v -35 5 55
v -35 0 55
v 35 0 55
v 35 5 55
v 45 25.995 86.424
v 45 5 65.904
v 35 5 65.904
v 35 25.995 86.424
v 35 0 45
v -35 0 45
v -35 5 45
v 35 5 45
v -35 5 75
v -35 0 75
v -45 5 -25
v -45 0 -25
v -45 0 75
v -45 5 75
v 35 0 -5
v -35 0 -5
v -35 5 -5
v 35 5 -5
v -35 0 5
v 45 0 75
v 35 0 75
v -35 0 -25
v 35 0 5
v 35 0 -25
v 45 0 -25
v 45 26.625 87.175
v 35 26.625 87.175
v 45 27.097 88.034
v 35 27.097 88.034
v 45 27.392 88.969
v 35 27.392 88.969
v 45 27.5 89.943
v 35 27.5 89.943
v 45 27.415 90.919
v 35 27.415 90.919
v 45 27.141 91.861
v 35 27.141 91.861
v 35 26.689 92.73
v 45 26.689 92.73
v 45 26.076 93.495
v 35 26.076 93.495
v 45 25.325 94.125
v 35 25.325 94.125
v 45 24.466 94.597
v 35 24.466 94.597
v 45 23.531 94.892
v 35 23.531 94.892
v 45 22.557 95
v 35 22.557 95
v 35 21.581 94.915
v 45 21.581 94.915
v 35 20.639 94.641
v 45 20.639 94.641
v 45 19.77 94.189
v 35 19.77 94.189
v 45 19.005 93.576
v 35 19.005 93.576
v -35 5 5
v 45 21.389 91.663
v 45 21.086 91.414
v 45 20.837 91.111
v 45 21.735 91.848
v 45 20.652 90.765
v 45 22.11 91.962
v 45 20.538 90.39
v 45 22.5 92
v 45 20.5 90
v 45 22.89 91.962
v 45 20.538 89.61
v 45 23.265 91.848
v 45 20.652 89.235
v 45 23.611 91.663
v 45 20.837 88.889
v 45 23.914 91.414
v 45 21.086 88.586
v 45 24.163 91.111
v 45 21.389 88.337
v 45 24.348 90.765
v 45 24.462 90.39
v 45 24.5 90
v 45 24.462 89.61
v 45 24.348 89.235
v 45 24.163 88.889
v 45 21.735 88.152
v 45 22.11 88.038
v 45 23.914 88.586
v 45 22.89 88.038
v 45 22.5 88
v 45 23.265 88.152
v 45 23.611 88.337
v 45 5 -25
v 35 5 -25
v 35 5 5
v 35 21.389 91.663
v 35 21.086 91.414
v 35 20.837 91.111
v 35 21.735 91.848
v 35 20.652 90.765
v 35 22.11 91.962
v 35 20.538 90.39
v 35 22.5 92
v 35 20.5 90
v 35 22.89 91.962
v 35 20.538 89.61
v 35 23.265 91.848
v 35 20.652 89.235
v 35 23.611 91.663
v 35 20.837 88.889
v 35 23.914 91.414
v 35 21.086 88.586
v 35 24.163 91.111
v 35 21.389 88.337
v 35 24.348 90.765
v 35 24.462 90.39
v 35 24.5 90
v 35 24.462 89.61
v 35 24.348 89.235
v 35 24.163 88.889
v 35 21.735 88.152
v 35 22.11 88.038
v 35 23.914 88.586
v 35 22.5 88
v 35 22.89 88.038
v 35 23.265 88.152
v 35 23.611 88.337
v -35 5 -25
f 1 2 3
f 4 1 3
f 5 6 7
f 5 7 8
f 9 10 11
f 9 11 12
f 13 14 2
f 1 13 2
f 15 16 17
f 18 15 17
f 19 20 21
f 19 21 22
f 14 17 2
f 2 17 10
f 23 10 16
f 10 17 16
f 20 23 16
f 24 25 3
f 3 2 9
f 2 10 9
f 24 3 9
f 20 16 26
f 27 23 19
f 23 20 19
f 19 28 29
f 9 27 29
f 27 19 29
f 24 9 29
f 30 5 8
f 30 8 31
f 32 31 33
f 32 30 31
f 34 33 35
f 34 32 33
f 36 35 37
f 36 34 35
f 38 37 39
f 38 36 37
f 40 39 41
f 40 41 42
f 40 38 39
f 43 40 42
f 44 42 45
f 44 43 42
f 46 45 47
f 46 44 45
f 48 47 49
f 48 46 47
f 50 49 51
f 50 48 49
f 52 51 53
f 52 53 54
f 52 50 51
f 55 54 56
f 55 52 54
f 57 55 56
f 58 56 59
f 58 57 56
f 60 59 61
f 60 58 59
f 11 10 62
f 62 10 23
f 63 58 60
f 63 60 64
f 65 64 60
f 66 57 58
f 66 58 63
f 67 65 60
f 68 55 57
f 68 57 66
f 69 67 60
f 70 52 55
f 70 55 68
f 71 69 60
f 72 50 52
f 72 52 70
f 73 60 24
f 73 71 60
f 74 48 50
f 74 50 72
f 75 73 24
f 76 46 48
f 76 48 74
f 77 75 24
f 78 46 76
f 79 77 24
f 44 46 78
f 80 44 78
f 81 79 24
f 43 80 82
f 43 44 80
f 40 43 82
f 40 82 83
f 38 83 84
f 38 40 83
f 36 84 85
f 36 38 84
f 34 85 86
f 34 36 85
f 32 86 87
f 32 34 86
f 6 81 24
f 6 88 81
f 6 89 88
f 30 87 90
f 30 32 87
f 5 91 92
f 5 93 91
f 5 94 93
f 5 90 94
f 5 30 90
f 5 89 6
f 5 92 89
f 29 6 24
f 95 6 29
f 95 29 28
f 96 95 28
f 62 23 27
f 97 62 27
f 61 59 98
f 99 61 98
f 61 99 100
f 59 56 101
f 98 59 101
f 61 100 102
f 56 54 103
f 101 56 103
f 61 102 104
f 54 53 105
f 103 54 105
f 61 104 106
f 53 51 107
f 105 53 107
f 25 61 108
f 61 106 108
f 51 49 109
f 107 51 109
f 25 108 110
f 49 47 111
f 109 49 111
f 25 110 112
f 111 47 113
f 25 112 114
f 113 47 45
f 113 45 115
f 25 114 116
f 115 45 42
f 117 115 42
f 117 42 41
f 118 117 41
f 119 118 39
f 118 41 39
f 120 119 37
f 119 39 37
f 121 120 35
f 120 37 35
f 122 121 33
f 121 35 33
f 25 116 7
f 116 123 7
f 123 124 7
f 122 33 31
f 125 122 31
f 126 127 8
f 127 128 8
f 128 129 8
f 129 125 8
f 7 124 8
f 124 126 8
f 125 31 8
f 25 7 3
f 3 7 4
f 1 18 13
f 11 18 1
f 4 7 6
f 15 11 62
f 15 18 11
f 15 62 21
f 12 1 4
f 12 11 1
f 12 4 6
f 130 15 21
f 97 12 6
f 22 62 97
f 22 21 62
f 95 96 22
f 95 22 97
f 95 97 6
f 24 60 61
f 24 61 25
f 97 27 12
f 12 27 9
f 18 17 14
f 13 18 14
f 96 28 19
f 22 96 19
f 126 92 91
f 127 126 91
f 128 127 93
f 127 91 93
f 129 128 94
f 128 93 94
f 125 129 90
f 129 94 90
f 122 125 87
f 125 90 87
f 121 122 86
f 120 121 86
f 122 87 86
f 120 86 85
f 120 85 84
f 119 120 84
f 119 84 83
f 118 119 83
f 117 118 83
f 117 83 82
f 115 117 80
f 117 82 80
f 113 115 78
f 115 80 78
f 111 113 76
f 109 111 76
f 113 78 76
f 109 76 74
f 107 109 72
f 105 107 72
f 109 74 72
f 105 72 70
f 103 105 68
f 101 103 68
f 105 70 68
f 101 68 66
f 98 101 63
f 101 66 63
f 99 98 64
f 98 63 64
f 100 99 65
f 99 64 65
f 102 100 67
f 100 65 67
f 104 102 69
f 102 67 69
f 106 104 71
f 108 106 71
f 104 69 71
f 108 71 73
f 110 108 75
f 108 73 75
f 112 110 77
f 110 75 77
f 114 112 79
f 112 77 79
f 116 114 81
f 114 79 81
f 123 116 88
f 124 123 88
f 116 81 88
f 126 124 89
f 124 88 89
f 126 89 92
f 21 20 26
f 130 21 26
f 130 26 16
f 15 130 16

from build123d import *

# Parameters (mm, degrees)
ESQUISSE1_W        = 70
ESQUISSE1_H        = 10
BOSS_EXTRU_1_DEPTH = 5
ESQUISSE3_R        = 5
ESQUISSE3_R_2      = 2
BOSS_EXTRU_2_DEPTH = 10


with BuildPart() as part:
    # Esquisse1 → Boss.-Extru.1 (new body)
    with BuildSketch(Plane(origin=(0, 0, 0), x_dir=(1, 0, 0), z_dir=(0, 1, 0))):
        Polygon((-35, -45), (-35, -5), (-35, 5), (-35, 25), (-45, 25), (-45, -75), (-35, -75), (-35, -55), align=None)
        Rectangle(ESQUISSE1_W, ESQUISSE1_H)
        Polygon((35, 5), (35, -5), (35, -45), (35, -55), (35, -75), (45, -75), (45, 25), (35, 25), align=None)
        with Locations((0, -50)):
            Rectangle(ESQUISSE1_W, ESQUISSE1_H)
    extrude(amount=BOSS_EXTRU_1_DEPTH)

    # Esquisse3 → Boss.-Extru.2 (add)
    with BuildSketch(Plane(origin=(45, 0, 0), x_dir=(0, 0, -1), z_dir=(1, 0, 0))):
        with BuildLine():
            Line((-93.575697107, 19.005090817), (-75, 0))
            Line((-75, 0), (-75, 5))
            Line((-75, 5), (-65.90374461, 5))
            Line((-65.90374461, 5), (-86.424302893, 25.994909183))
            ThreePointArc((-86.424302893, 25.994909183), (-85.369747008, 24.386996882), (-85, 22.5))
            ThreePointArc((-85, 22.5), (-88.113003118, 17.869747008), (-93.575697107, 19.005090817))
        make_face()
        with Locations((-90, 22.5)):
            Circle(ESQUISSE3_R)
        with Locations((-90, 22.5)):
            Circle(ESQUISSE3_R_2, mode=Mode.SUBTRACT)
    extrude(amount=-BOSS_EXTRU_2_DEPTH)


solid = part.part
